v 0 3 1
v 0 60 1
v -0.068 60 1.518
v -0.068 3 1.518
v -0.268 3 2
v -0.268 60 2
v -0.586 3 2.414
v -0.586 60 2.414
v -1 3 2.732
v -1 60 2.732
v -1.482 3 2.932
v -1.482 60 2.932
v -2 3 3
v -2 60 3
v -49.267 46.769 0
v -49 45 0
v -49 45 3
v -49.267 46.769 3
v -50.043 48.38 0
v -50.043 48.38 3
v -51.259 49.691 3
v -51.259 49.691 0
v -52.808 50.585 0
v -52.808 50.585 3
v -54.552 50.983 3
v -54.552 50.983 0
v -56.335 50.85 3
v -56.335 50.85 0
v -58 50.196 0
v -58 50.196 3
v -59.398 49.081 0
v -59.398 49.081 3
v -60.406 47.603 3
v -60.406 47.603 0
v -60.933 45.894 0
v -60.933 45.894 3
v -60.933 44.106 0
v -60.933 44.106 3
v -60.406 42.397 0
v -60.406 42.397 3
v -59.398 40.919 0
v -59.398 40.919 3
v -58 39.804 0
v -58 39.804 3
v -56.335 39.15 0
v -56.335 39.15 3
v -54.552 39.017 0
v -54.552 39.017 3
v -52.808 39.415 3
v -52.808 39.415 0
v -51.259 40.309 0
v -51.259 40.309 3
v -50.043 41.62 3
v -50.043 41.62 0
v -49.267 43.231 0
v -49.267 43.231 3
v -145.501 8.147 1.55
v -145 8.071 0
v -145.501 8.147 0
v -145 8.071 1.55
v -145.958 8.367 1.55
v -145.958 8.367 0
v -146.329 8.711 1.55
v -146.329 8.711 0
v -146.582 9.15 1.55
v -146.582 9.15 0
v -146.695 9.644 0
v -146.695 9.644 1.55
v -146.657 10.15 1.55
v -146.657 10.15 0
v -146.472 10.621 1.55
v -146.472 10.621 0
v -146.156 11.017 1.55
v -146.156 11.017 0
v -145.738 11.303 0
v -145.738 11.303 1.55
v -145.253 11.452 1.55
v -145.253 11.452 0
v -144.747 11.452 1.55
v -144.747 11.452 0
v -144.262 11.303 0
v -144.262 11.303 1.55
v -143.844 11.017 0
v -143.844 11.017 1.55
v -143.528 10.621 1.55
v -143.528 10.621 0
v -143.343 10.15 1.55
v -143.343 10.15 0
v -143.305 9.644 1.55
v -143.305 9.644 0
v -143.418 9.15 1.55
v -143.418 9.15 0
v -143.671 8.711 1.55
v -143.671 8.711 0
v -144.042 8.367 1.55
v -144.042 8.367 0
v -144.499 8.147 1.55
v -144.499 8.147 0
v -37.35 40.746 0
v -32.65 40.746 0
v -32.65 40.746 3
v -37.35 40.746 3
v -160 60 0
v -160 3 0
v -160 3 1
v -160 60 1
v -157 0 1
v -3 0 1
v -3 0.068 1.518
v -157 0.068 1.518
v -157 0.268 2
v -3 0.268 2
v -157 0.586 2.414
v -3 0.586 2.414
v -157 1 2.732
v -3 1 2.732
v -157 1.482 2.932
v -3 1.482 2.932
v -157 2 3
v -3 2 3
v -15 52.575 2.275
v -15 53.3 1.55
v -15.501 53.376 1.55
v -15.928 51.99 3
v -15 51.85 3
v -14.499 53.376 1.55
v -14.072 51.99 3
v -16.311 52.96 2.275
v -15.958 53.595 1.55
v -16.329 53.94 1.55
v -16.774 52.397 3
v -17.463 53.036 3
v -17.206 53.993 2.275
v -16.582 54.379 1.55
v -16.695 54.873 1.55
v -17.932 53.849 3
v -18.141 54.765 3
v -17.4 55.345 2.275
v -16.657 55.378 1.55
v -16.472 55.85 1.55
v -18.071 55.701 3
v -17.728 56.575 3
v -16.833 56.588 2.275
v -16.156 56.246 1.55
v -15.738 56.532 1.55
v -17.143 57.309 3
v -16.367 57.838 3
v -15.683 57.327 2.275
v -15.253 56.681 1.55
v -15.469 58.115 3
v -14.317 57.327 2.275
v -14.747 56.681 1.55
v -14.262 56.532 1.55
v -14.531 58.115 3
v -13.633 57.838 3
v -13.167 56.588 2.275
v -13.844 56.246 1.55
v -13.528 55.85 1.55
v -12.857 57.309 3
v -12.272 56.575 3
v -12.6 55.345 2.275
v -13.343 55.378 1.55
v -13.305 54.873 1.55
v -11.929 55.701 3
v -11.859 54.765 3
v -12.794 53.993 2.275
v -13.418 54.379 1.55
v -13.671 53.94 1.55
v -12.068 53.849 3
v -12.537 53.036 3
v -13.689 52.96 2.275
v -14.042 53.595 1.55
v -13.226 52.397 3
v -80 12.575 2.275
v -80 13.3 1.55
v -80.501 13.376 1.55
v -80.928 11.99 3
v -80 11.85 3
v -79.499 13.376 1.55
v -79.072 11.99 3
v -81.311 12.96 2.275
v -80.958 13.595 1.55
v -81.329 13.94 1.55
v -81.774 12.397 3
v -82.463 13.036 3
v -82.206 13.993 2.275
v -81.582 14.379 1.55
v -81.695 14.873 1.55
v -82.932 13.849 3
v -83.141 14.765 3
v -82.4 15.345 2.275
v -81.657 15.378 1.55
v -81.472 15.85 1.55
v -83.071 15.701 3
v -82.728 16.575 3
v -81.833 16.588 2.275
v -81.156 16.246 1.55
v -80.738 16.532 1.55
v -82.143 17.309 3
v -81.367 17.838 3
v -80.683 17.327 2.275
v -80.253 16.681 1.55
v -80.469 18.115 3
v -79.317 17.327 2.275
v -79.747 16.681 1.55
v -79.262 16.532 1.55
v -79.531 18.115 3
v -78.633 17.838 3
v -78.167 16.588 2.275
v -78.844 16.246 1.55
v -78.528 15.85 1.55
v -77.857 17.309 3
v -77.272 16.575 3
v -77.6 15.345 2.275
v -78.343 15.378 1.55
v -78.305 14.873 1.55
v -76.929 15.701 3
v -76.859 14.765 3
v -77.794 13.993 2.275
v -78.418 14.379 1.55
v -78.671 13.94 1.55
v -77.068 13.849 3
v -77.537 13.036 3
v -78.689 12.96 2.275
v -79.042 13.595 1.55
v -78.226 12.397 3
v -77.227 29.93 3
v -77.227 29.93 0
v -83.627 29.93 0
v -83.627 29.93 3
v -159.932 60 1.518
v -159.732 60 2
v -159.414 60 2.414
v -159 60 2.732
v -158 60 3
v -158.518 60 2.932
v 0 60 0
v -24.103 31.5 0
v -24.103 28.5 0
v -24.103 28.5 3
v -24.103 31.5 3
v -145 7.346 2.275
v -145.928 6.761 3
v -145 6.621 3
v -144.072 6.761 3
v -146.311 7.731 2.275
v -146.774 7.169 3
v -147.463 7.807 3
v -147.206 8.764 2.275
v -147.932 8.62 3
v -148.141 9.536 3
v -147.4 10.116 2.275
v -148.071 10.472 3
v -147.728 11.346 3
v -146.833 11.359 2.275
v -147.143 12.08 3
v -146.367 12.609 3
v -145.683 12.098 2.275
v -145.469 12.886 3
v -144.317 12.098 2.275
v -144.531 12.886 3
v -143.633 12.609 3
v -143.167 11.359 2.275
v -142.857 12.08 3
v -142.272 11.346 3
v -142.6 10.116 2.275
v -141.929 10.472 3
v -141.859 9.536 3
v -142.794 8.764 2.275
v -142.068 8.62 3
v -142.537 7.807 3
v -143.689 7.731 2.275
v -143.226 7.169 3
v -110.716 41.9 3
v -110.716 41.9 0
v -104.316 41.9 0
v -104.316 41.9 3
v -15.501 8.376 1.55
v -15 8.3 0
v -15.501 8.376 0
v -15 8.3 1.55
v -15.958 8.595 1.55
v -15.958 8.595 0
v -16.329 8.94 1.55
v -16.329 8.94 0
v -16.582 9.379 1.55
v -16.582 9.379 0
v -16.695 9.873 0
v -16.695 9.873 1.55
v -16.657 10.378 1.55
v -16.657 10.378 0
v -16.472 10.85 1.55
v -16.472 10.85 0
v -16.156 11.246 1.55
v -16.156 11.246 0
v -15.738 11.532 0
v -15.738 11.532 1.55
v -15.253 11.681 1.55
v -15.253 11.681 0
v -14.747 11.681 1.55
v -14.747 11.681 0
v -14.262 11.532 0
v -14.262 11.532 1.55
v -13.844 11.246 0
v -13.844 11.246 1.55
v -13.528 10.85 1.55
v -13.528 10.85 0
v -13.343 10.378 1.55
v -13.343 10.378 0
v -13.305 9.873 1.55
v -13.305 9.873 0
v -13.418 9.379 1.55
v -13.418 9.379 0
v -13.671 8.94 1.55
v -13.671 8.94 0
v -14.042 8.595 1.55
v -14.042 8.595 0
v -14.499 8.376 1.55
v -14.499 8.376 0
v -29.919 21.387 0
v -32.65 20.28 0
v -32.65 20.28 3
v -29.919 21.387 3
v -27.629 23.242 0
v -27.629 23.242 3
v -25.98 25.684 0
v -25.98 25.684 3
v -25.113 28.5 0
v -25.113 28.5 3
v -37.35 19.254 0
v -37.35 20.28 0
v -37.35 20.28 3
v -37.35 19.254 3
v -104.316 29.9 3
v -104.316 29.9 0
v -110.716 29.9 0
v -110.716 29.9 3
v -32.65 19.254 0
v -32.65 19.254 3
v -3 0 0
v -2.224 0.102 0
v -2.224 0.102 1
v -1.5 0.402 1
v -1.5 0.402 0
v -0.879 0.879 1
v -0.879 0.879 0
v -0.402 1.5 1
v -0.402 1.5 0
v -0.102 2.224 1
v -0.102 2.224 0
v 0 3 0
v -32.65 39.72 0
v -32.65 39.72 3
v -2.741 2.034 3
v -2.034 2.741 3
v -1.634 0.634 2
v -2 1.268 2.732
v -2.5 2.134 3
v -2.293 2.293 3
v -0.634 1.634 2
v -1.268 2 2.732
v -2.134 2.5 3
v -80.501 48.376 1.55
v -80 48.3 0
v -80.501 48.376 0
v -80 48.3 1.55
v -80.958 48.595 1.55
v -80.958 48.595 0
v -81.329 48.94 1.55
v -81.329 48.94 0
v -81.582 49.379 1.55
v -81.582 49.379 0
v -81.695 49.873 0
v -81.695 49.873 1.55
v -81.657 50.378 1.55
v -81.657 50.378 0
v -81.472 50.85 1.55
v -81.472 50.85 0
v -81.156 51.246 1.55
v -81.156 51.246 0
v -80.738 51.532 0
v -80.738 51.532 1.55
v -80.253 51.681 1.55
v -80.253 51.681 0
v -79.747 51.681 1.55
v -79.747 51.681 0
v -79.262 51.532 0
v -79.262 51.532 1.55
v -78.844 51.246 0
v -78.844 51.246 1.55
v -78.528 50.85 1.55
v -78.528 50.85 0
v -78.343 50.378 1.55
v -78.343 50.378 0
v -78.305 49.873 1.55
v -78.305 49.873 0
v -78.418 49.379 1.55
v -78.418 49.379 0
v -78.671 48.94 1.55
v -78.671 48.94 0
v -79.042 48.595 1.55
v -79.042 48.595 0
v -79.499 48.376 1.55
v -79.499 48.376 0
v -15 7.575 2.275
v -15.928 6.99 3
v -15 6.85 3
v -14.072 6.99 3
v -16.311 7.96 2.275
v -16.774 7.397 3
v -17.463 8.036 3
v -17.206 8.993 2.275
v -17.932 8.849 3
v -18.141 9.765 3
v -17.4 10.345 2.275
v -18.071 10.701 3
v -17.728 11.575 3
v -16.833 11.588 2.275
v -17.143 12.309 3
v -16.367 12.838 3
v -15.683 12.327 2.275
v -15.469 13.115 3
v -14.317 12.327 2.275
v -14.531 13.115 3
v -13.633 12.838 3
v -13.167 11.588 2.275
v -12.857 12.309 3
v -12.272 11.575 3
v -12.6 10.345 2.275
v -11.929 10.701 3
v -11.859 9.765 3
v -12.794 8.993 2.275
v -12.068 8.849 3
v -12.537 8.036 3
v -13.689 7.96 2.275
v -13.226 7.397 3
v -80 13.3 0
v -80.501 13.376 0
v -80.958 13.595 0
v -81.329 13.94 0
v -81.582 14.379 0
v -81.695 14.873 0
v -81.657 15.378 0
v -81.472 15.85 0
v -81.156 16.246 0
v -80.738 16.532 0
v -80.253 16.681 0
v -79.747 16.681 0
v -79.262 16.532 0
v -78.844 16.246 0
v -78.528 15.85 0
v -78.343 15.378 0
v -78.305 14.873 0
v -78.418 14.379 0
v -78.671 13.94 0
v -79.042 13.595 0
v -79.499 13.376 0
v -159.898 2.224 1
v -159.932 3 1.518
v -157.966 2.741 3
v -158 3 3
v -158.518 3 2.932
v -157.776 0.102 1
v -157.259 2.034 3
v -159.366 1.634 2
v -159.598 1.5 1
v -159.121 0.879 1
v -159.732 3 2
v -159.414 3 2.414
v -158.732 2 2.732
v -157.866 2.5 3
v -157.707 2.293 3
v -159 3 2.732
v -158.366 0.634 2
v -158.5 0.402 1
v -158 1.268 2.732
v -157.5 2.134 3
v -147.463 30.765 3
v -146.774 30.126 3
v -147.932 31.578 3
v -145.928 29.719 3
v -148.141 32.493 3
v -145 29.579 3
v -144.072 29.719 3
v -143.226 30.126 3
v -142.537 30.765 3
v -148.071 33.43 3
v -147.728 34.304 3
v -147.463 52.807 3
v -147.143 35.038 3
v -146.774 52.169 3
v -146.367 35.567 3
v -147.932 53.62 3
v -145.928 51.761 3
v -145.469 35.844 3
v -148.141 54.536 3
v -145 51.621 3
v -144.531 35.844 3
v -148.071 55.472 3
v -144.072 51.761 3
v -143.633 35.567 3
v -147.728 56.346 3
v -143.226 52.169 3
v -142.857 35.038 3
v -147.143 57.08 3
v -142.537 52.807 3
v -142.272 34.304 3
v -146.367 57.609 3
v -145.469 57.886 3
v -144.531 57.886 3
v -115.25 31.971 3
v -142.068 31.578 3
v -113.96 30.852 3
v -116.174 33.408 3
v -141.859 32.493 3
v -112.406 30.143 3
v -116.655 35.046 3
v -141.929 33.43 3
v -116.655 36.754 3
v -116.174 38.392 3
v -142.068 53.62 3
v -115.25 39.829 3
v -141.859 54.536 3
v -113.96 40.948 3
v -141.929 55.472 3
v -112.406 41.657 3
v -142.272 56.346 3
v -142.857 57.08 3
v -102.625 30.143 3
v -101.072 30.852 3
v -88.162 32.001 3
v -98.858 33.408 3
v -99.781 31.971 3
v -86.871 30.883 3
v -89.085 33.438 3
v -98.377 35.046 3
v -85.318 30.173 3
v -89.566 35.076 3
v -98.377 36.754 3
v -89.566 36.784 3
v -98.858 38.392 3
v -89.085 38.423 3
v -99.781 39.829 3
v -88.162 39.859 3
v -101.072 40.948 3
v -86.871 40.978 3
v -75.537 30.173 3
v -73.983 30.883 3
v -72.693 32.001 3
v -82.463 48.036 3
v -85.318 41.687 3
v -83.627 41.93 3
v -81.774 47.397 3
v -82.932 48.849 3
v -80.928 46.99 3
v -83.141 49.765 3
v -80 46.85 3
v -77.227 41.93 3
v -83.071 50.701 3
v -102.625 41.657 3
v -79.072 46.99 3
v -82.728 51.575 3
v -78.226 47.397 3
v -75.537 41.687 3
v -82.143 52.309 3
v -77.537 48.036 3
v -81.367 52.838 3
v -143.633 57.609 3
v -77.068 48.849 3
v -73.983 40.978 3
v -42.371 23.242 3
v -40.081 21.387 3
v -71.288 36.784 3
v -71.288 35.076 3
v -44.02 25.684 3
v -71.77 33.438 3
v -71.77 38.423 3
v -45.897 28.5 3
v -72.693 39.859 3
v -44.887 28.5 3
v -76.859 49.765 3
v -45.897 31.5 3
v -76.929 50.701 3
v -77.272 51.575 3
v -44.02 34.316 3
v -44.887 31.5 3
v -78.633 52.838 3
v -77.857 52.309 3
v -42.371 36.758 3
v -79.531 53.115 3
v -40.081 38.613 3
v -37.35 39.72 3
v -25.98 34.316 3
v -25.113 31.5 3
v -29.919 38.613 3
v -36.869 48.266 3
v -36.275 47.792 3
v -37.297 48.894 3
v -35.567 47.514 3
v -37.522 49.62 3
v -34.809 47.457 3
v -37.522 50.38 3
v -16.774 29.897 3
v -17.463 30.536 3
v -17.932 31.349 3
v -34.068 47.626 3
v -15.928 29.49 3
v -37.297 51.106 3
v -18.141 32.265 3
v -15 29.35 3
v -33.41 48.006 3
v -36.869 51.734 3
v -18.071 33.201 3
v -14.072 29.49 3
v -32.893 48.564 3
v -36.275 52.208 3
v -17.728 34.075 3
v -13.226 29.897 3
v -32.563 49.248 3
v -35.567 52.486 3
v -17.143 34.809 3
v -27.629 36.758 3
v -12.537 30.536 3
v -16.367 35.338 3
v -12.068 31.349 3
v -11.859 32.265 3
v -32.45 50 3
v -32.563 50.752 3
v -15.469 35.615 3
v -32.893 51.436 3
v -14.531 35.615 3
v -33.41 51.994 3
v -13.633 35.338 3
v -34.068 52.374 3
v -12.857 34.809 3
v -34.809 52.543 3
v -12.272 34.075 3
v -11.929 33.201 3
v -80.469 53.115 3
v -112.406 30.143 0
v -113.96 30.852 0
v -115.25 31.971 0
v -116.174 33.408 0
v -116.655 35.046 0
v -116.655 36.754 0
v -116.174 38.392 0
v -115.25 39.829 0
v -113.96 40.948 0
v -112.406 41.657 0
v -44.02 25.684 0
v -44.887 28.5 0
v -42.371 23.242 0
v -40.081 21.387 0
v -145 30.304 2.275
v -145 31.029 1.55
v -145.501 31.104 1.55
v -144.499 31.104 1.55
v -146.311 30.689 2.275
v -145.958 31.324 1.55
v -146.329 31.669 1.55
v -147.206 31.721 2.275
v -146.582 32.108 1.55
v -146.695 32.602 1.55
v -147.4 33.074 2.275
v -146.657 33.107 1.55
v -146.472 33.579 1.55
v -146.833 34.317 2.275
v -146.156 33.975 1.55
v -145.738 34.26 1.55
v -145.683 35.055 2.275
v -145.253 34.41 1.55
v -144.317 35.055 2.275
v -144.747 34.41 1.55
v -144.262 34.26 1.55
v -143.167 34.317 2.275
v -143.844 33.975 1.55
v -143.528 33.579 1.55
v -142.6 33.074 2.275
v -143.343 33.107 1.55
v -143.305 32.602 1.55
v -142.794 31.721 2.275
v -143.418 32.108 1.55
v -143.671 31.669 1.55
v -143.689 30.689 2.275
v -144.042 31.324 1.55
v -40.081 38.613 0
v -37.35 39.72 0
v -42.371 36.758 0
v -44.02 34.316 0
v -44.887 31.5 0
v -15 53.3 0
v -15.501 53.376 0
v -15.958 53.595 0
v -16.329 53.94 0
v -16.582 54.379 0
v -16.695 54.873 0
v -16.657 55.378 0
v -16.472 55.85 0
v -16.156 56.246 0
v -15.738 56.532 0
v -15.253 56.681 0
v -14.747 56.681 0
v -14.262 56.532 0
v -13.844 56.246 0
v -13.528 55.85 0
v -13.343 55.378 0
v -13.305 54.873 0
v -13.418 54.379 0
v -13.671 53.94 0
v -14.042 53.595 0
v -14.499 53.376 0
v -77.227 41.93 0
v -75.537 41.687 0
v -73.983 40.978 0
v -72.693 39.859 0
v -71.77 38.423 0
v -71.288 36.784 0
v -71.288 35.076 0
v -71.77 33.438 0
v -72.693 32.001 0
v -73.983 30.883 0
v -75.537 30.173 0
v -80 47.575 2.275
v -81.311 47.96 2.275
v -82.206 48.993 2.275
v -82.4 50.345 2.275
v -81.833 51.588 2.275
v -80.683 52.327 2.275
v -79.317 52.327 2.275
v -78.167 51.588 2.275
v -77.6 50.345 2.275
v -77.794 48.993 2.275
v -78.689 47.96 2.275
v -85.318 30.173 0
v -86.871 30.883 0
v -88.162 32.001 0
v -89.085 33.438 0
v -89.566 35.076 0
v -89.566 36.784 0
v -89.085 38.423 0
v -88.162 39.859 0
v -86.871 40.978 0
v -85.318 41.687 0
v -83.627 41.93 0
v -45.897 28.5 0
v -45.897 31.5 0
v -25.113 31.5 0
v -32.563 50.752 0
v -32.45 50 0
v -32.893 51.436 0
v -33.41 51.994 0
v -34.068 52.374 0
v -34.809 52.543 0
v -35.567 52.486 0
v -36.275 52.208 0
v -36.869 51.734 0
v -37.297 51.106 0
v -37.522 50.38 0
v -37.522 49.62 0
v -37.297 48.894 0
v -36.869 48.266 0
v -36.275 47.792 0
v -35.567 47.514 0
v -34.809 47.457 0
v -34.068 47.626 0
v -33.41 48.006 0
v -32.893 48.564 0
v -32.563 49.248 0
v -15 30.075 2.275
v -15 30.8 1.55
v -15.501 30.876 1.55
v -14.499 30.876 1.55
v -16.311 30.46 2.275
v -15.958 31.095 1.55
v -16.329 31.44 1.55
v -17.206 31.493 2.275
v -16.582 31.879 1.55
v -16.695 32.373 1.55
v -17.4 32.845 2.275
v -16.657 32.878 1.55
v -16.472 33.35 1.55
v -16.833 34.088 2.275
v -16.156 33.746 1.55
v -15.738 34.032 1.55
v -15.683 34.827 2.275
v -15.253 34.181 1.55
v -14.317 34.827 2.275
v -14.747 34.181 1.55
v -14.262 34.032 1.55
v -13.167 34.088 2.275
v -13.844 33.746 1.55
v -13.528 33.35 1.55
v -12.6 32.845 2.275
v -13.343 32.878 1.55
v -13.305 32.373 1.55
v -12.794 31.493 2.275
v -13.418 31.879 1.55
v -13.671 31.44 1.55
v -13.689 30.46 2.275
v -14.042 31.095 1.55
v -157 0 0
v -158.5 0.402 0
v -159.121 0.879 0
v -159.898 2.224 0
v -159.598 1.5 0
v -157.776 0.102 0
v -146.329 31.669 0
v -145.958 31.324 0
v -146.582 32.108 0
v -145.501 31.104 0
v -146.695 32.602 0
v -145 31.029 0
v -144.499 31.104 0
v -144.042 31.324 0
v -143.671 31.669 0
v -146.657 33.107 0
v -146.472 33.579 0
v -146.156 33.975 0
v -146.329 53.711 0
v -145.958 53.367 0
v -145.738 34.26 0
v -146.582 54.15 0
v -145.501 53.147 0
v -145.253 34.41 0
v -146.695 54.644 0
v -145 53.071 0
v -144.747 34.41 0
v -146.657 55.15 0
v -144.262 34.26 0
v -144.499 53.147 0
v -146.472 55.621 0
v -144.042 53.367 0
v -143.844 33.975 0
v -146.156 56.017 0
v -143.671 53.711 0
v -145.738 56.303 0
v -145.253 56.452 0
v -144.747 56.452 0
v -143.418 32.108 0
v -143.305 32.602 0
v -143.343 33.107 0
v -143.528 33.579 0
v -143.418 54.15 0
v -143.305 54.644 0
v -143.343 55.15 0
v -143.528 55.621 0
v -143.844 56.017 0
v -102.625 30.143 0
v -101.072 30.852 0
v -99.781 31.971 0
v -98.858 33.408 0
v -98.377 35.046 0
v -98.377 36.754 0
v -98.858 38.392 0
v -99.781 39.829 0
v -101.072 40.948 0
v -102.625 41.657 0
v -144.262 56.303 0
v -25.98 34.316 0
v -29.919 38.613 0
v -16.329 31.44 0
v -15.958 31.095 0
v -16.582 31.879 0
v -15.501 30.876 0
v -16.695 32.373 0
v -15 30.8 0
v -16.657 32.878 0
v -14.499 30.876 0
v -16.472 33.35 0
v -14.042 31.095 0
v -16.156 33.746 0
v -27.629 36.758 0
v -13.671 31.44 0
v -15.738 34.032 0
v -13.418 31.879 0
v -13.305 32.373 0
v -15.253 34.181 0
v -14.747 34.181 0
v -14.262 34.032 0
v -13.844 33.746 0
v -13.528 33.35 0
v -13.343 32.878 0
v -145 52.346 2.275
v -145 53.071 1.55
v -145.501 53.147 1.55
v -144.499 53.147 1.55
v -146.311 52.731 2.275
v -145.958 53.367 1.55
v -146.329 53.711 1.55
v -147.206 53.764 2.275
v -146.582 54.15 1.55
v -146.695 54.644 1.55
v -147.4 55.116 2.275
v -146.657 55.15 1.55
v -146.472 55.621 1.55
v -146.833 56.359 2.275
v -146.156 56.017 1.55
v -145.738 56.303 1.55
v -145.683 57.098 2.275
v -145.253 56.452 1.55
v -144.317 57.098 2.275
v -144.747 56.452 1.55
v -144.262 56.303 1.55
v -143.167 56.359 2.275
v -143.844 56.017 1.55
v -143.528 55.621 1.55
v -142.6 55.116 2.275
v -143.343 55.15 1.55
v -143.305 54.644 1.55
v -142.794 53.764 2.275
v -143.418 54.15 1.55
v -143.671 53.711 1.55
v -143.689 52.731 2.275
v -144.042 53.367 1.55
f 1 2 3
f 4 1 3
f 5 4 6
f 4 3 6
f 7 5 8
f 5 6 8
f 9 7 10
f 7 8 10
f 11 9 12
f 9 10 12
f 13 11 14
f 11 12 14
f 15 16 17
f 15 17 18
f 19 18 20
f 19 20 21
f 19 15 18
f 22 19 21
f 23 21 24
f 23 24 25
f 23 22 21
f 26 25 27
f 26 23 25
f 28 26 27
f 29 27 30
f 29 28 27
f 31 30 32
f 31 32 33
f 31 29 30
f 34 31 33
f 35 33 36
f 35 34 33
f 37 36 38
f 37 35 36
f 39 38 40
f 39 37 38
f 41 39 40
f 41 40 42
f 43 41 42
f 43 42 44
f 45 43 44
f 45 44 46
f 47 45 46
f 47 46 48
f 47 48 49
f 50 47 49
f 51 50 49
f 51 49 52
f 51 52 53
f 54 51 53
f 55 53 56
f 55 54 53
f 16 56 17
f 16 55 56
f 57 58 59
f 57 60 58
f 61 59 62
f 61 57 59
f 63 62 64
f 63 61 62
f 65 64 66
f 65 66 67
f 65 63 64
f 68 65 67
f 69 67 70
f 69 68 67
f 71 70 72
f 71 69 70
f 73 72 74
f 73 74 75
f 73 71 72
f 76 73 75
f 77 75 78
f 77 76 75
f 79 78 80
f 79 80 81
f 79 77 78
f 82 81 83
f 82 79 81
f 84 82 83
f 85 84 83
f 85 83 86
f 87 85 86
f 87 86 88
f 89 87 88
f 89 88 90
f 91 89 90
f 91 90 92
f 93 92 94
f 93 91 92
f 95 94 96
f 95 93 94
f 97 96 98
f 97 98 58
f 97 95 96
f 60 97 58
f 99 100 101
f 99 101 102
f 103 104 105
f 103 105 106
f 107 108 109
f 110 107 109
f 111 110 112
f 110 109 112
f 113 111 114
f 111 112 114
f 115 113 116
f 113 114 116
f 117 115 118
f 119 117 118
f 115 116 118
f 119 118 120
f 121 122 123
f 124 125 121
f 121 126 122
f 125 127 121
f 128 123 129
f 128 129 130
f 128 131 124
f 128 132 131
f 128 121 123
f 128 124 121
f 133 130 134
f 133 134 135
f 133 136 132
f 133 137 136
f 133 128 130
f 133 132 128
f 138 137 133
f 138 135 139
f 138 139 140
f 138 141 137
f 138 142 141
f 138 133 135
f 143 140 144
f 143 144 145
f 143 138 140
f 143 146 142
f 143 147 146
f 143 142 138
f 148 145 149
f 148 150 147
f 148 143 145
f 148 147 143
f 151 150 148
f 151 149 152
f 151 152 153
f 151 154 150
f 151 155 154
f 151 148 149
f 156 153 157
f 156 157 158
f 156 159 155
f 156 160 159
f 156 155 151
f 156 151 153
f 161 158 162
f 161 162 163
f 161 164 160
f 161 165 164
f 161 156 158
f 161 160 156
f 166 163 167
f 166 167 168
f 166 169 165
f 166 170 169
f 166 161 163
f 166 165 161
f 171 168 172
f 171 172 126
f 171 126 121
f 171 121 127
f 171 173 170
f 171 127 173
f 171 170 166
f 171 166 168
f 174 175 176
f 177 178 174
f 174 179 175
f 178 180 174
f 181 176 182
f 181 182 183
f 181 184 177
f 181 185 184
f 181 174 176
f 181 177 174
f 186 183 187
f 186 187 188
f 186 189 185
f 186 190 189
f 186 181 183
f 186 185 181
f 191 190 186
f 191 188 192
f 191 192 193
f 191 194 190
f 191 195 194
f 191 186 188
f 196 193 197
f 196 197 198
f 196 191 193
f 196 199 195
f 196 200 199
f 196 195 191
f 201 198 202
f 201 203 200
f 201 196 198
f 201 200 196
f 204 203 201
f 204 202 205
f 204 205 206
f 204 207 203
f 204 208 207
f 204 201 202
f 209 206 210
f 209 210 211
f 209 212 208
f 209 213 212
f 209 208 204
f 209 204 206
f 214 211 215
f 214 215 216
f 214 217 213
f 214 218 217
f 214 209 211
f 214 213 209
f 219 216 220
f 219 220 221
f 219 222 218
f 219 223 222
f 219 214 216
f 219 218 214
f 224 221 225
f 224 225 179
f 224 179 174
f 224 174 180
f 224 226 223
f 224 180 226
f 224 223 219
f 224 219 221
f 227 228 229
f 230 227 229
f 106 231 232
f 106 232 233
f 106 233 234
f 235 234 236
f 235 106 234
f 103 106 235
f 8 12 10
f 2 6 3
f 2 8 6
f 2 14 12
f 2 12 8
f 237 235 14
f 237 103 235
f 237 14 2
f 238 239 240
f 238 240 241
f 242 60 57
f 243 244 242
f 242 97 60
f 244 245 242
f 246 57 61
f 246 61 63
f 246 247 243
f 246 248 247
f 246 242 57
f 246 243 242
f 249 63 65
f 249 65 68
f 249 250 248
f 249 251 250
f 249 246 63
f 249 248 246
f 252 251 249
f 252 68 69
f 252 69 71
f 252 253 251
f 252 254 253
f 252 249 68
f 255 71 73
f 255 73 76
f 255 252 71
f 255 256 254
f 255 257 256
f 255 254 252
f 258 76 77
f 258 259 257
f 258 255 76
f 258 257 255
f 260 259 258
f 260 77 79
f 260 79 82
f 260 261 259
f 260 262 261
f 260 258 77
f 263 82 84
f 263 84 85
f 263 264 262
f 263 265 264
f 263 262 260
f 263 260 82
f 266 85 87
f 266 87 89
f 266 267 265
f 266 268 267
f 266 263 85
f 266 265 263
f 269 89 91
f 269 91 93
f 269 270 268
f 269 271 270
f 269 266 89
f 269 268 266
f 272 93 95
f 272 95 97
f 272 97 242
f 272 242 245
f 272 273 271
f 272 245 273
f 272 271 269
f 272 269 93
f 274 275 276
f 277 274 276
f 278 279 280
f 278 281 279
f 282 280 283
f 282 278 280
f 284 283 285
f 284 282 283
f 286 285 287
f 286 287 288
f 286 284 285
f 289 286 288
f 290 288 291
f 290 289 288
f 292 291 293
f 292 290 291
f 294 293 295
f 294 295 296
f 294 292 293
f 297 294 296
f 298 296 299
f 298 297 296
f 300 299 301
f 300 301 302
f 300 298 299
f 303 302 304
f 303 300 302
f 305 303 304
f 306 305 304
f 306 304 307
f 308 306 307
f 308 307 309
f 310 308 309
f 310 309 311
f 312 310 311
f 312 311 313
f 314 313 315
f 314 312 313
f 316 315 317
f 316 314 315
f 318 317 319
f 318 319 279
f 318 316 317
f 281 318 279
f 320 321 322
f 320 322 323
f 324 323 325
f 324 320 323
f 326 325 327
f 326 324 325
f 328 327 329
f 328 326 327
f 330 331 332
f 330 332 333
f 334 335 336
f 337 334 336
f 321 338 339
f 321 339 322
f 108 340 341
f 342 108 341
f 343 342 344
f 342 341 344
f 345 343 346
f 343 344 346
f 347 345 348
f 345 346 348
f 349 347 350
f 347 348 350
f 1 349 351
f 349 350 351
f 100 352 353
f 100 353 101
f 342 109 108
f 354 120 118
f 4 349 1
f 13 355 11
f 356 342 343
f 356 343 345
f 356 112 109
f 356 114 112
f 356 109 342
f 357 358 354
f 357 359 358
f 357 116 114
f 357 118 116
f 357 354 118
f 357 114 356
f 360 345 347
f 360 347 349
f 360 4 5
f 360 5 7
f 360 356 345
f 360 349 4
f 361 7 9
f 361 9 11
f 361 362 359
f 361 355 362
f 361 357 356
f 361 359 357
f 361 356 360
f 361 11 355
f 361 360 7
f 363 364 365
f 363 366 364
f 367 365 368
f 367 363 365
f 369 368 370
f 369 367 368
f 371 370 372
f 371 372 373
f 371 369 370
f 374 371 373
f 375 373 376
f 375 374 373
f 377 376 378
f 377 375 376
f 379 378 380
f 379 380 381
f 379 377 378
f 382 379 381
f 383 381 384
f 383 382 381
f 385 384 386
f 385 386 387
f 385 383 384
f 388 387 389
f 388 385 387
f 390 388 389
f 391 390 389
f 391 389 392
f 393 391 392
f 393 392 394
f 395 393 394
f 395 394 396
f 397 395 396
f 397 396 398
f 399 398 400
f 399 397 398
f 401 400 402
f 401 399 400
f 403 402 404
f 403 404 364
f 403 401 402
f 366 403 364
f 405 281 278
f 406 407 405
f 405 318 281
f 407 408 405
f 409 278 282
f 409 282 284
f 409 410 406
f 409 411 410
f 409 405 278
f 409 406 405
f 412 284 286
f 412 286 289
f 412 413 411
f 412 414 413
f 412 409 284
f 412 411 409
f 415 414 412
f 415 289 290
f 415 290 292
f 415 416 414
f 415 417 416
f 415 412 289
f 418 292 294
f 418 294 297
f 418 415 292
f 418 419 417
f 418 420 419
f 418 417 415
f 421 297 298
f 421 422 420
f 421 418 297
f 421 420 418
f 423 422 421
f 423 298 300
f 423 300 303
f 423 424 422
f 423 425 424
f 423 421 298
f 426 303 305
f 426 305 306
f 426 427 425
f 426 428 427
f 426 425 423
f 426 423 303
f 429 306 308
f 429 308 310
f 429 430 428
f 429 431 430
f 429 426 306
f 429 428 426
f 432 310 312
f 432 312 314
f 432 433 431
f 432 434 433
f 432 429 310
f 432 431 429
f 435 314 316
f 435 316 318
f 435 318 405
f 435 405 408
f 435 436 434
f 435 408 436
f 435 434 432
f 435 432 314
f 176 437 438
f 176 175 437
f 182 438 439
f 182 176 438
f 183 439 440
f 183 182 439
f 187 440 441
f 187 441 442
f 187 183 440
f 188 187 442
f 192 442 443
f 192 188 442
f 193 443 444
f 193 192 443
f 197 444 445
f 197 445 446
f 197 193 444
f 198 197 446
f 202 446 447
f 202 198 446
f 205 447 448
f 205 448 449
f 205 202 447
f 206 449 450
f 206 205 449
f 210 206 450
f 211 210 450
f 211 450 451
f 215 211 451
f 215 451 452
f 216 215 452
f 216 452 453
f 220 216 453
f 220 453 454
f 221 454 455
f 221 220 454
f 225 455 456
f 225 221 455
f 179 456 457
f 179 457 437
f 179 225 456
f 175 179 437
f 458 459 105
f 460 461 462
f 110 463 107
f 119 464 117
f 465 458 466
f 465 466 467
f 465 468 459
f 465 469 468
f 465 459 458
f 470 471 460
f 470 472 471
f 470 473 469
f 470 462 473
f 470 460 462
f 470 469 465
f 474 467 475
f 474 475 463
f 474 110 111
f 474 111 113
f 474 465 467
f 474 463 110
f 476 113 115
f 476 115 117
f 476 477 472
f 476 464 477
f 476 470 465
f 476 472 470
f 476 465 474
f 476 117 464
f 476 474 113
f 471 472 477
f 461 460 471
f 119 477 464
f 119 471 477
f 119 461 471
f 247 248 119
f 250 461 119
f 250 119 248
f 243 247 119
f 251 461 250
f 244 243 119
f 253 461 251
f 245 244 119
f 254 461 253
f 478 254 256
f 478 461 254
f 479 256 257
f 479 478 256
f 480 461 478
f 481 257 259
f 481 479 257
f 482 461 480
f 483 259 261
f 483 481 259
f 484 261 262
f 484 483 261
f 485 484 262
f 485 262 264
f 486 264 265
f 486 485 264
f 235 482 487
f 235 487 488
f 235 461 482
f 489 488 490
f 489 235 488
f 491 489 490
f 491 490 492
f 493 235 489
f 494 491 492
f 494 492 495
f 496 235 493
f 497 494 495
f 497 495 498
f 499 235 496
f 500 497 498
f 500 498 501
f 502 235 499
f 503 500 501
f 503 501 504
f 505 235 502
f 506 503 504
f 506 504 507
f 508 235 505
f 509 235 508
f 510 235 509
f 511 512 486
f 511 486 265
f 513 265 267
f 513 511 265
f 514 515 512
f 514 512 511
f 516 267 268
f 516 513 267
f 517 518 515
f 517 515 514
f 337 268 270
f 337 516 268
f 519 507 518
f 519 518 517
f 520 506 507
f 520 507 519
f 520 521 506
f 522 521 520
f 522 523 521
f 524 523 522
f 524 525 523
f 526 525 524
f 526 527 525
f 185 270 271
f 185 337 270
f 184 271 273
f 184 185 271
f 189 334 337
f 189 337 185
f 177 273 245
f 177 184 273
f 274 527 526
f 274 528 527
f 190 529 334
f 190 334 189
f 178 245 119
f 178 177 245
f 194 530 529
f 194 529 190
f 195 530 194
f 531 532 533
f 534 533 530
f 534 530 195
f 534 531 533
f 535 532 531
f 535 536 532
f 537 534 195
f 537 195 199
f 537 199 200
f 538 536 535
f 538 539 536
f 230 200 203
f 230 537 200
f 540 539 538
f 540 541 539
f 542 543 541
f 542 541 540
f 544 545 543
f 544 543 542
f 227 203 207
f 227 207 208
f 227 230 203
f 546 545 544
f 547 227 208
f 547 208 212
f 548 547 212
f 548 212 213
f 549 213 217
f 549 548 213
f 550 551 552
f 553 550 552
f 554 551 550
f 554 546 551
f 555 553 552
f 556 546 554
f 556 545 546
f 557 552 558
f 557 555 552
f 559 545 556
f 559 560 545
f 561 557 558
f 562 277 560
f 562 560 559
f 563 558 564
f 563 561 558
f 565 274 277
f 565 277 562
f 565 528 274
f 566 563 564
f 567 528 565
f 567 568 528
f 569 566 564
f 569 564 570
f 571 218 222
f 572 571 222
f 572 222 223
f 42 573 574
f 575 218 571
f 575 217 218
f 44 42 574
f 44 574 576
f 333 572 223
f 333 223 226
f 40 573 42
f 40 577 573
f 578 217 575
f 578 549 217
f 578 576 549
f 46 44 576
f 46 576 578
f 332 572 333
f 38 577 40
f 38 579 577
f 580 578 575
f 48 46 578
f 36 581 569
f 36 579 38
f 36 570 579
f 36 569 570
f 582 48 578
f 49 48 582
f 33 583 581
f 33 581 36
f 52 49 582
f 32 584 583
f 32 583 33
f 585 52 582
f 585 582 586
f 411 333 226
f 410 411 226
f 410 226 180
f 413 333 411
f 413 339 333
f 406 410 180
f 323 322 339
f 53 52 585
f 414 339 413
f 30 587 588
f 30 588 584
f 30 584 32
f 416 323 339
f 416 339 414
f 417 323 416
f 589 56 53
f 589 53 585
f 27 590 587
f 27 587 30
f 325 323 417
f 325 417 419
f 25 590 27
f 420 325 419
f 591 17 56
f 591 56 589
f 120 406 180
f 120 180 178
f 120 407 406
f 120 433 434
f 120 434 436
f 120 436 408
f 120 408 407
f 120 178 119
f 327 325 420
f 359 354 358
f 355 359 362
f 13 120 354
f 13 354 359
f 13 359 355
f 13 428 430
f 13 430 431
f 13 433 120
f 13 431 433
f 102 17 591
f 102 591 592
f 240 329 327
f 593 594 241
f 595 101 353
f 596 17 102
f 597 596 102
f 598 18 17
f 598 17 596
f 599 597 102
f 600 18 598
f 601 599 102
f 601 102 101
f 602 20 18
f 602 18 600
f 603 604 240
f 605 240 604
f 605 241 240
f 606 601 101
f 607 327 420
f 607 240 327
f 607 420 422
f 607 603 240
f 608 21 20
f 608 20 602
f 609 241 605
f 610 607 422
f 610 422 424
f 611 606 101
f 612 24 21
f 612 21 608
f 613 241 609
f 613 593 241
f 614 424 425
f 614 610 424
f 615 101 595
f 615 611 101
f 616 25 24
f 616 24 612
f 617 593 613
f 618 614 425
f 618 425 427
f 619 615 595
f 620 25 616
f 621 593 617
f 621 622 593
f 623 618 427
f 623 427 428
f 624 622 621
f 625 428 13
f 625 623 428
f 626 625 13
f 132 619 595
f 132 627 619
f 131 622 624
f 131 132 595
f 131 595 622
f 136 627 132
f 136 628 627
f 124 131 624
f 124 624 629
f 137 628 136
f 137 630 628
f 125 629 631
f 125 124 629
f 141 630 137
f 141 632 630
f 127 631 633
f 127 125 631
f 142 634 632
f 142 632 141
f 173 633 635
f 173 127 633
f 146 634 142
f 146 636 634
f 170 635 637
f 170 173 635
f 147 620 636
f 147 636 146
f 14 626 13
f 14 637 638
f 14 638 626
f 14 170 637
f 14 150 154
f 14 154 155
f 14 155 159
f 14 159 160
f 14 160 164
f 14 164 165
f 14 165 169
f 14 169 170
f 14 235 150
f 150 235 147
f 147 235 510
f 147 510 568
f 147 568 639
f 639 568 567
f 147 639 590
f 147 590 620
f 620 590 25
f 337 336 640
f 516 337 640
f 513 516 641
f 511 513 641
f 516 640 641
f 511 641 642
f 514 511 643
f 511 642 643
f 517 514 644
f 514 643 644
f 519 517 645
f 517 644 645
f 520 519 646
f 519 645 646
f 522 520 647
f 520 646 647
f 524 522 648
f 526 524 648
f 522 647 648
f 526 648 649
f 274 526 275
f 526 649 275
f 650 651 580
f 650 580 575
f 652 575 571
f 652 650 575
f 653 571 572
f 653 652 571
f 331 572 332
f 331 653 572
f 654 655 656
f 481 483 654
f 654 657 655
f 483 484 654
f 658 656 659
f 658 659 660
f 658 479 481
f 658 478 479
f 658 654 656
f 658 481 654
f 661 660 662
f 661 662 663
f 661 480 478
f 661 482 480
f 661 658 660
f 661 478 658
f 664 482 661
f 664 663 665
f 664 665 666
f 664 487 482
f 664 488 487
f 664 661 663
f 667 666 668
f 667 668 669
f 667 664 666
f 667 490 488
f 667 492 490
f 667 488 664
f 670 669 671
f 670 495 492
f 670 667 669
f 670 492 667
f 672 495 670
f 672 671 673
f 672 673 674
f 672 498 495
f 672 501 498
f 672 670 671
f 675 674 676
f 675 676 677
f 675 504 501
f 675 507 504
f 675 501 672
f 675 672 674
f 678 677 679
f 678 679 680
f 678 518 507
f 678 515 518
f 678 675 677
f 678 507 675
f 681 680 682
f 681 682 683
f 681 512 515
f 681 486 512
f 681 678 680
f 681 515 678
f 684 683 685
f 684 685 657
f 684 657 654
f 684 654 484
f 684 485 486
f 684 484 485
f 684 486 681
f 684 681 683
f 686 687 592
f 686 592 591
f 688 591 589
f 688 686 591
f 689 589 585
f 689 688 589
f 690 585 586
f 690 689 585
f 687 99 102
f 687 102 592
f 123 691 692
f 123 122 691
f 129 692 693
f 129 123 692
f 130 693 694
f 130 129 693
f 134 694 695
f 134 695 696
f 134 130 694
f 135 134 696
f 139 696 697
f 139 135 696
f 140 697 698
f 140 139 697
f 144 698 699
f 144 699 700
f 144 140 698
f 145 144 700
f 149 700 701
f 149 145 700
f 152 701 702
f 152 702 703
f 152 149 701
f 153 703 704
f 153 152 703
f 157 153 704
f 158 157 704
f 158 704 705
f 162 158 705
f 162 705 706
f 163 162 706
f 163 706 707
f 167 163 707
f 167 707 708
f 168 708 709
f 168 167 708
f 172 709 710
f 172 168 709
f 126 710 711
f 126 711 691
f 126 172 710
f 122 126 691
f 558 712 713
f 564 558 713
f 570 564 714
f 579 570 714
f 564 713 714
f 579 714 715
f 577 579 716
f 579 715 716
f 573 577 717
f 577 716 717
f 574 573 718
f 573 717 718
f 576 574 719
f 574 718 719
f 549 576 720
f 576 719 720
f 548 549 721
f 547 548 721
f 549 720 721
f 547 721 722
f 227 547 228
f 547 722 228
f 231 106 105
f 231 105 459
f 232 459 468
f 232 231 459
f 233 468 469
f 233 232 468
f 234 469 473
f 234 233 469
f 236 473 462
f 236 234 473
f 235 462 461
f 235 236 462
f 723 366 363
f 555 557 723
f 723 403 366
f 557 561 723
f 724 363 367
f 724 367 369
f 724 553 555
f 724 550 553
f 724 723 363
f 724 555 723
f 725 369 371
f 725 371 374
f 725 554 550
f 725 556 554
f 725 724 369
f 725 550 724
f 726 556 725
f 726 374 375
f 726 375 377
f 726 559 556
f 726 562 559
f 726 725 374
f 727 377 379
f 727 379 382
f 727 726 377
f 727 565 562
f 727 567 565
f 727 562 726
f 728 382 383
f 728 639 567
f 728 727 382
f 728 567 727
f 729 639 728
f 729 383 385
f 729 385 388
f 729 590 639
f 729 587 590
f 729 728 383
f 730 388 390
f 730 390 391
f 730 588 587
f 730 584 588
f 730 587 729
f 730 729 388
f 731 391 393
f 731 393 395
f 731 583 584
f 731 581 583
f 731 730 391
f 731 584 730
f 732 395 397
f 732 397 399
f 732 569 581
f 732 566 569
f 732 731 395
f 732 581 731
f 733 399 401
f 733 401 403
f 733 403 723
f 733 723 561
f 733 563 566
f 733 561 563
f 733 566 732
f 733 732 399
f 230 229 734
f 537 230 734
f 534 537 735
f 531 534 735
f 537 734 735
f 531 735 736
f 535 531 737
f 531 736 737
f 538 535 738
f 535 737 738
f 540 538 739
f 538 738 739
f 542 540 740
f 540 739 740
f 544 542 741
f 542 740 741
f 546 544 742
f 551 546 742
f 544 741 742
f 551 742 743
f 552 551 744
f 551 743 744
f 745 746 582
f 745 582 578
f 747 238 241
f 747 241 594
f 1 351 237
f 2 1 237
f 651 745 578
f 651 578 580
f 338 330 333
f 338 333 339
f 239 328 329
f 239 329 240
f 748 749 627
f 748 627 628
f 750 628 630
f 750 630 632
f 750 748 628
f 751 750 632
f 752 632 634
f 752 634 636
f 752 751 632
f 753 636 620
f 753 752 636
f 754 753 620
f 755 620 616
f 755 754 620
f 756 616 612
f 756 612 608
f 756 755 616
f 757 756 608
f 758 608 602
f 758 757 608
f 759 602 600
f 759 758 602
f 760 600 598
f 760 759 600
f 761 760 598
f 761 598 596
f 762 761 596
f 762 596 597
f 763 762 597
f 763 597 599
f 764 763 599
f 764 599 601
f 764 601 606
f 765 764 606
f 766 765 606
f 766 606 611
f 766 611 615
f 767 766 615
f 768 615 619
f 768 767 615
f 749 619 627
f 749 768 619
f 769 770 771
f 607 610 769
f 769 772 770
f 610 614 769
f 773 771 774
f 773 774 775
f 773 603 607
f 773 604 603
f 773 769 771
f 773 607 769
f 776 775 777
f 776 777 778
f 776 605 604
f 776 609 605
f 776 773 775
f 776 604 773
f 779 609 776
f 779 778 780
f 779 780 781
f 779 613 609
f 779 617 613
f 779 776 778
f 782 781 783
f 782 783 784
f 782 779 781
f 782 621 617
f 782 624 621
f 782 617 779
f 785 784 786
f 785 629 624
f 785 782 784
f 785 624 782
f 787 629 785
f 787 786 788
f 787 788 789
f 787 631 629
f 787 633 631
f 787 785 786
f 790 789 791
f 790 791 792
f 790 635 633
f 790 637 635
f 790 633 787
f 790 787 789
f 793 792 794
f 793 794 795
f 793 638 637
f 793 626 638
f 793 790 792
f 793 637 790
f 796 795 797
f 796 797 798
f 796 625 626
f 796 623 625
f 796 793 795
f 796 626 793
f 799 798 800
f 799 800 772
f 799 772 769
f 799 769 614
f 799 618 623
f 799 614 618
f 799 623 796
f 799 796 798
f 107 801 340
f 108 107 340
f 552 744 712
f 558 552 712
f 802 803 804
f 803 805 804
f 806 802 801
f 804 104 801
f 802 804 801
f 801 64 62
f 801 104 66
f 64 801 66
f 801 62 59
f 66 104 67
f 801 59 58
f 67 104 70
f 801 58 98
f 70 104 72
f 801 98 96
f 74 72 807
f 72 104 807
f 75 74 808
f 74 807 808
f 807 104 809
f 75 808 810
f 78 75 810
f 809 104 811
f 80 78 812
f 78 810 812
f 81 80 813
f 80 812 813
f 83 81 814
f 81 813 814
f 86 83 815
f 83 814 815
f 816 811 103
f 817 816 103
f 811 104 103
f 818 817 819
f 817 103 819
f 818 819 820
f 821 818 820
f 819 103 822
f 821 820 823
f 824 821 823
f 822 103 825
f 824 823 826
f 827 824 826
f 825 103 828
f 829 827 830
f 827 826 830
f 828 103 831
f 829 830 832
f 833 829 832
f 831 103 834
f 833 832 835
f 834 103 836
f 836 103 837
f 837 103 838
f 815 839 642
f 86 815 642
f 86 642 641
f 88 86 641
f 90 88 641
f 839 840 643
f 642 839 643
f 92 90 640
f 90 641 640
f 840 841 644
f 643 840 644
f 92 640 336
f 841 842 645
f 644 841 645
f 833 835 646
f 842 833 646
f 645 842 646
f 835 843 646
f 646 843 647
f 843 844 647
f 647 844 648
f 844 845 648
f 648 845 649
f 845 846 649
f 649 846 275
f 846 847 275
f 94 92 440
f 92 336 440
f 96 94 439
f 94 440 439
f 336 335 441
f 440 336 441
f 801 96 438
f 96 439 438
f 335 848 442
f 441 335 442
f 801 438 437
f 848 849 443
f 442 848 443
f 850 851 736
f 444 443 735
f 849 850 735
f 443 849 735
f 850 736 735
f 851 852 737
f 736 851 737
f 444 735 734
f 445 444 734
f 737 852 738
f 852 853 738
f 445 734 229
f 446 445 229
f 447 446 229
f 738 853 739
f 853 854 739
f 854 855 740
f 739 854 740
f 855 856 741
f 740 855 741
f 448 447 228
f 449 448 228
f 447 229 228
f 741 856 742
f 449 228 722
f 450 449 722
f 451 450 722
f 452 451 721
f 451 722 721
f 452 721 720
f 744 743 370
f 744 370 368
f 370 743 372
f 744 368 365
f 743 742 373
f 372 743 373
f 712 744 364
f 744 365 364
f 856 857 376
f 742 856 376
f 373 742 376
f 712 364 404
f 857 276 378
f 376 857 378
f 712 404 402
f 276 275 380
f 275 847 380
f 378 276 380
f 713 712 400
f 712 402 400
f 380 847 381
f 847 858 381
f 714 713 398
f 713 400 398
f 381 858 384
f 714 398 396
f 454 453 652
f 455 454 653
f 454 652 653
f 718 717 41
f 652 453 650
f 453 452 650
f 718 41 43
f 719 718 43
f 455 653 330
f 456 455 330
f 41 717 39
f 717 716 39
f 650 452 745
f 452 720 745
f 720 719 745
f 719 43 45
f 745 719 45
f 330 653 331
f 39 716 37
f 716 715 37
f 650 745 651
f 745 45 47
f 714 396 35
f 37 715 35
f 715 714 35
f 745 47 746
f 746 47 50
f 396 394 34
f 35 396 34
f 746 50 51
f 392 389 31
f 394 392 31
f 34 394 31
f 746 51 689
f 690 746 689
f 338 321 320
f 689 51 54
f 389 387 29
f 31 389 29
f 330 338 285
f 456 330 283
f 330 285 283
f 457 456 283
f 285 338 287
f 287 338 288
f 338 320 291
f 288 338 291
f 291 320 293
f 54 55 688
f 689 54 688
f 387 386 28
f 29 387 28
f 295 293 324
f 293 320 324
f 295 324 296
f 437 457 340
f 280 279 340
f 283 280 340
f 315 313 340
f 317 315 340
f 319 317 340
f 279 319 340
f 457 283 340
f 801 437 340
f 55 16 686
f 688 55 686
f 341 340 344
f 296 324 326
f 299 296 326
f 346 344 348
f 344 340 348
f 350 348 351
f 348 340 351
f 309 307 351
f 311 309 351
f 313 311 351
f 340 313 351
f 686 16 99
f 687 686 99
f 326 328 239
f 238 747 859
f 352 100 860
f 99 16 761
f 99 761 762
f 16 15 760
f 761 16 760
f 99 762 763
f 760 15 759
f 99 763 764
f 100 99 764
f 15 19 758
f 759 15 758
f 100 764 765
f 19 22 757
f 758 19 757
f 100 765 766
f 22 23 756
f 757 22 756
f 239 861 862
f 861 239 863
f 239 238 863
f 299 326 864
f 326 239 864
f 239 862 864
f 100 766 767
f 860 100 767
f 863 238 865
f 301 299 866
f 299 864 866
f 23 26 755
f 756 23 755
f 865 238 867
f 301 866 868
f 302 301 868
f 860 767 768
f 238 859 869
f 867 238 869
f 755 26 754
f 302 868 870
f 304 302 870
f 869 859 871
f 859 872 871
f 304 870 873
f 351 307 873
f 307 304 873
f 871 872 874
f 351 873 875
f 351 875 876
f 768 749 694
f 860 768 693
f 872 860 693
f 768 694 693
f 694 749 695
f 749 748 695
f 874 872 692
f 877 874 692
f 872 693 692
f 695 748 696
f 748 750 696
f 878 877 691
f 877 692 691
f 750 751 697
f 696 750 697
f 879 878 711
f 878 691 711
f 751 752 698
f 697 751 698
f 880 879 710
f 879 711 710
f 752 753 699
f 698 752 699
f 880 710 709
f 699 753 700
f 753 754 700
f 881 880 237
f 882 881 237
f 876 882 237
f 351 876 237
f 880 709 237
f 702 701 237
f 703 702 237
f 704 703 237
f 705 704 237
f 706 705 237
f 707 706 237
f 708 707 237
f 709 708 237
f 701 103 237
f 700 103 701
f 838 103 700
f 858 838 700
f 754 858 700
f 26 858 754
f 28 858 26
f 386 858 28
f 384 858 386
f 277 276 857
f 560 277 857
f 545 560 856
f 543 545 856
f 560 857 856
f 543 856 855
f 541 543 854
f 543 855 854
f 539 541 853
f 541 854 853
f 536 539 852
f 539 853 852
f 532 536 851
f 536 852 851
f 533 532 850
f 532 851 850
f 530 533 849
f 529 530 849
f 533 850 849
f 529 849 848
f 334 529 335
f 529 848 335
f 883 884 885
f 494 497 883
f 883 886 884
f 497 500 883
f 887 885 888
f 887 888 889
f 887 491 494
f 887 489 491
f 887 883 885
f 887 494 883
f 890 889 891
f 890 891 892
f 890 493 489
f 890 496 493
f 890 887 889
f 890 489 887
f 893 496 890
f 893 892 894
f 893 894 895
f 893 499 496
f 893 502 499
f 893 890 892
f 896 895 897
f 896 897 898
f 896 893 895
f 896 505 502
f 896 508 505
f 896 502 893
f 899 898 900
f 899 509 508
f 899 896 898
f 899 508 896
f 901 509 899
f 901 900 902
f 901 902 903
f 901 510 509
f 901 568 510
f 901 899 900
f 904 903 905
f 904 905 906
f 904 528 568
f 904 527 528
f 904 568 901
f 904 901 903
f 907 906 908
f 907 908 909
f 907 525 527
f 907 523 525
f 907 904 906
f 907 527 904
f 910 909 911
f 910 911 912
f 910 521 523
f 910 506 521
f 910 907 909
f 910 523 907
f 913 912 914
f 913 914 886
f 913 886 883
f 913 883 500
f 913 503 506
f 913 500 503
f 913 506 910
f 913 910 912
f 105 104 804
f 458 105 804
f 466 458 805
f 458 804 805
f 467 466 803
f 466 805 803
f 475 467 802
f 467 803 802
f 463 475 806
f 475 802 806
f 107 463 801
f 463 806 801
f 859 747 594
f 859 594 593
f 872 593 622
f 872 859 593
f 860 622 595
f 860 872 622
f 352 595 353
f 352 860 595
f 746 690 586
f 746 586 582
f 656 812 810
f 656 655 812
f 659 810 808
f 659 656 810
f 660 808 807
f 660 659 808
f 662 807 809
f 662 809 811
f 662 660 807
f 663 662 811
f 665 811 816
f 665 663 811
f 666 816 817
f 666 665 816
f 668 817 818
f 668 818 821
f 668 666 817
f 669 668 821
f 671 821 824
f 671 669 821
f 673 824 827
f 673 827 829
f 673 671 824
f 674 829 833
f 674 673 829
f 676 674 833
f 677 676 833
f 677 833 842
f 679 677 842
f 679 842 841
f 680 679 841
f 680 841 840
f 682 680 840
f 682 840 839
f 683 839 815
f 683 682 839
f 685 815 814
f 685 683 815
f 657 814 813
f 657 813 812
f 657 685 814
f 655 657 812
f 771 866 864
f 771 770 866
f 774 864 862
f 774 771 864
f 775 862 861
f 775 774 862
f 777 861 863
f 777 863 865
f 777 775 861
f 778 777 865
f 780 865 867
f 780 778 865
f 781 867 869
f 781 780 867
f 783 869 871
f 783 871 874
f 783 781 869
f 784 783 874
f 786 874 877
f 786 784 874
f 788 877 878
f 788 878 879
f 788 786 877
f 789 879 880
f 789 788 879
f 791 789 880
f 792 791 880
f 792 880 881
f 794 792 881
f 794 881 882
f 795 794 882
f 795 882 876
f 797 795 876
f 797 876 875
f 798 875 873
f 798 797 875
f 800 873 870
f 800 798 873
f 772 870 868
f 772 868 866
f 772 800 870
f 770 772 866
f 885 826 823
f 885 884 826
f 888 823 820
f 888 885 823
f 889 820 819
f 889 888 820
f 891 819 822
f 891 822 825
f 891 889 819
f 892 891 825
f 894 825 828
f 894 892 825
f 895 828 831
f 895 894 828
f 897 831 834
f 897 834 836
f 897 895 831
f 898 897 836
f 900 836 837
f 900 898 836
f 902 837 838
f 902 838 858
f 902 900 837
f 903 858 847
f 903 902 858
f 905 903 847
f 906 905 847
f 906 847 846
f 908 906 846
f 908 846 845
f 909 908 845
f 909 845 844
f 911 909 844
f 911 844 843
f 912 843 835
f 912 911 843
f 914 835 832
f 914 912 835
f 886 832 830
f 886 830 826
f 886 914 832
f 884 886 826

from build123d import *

# Parameters (mm, degrees)
SKETCH11_W                                     = 160
SKETCH11_H                                     = 60
SKETCH11_R                                     = 2.55
SKETCH11_R_2                                   = 6
BOSS_EXTRUDE1_DEPTH                            = 3
FILLET1_R                                      = 2
FILLET3_R                                      = 3
CSK_FOR_M3_FLAT_HEAD_MACHINE_SCREW1_AT_2_COUNT = 2
CSK_FOR_M3_FLAT_HEAD_MACHINE_SCREW1_AT_2_PITCH = 22.042551394
CSK_FOR_M3_FLAT_HEAD_MACHINE_SCREW1_AT_3_COUNT = 2
CSK_FOR_M3_FLAT_HEAD_MACHINE_SCREW1_AT_3_PITCH = 45
CSK_FOR_M3_FLAT_HEAD_MACHINE_SCREW1_AT_4_COUNT = 2
CSK_FOR_M3_FLAT_HEAD_MACHINE_SCREW1_AT_4_PITCH = 137.493516675
CSK_FOR_M3_FLAT_HEAD_MACHINE_SCREW1_AT_5_COUNT = 2
CSK_FOR_M3_FLAT_HEAD_MACHINE_SCREW1_AT_5_PITCH = 131.893933603
CSK_FOR_M3_FLAT_HEAD_MACHINE_SCREW1_AT_6_COUNT = 2
CSK_FOR_M3_FLAT_HEAD_MACHINE_SCREW1_AT_6_PITCH = 130.000201211
CSK_FOR_M3_FLAT_HEAD_MACHINE_SCREW1_AT_7_COUNT = 2
CSK_FOR_M3_FLAT_HEAD_MACHINE_SCREW1_AT_7_PITCH = 65.174880681
CSK_FOR_M3_FLAT_HEAD_MACHINE_SCREW1_AT_8_COUNT = 2
CSK_FOR_M3_FLAT_HEAD_MACHINE_SCREW1_AT_8_PITCH = 76.202062771


with BuildPart() as part:
    # Sketch11 → Boss-Extrude1 (new body)
    with BuildSketch(Plane.XY):
        with Locations((-80, 30)):
            Rectangle(SKETCH11_W, SKETCH11_H)
        with Locations((-35, 50)):
            Circle(SKETCH11_R, mode=Mode.SUBTRACT)
        with Locations((-55, 45)):
            Circle(SKETCH11_R_2, mode=Mode.SUBTRACT)
        with BuildLine():
            Line((-44.886859967, 31.5), (-45.897247359, 31.5))
            Line((-45.897247359, 31.5), (-45.897247359, 28.5))
            Line((-45.897247359, 28.5), (-44.886859967, 28.5))
            ThreePointArc((-44.886859967, 28.5), (-42.370691635, 23.241826814), (-37.35, 20.280046296))
            Line((-37.35, 20.280046296), (-37.35, 19.253954216))
            Line((-37.35, 19.253954216), (-32.65, 19.253954216))
            Line((-32.65, 19.253954216), (-32.65, 20.280046296))
            ThreePointArc((-32.65, 20.280046296), (-27.629308365, 23.241826814), (-25.113140033, 28.5))
            Line((-25.113140033, 28.5), (-24.102752641, 28.5))
            Line((-24.102752641, 28.5), (-24.102752641, 31.5))
            Line((-24.102752641, 31.5), (-25.113140033, 31.5))
            ThreePointArc((-25.113140033, 31.5), (-27.629308365, 36.758173186), (-32.65, 39.719953704))
            Line((-32.65, 39.719953704), (-32.65, 40.746045784))
            Line((-32.65, 40.746045784), (-37.35, 40.746045784))
            Line((-37.35, 40.746045784), (-37.35, 39.719953704))
            ThreePointArc((-37.35, 39.719953704), (-42.370691635, 36.758173186), (-44.886859967, 31.5))
        make_face(mode=Mode.SUBTRACT)
        with BuildLine():
            Line((-83.627304882, 41.930328357), (-77.227304882, 41.930328357))
            ThreePointArc((-77.227304882, 41.930328357), (-71.227304882, 35.930328357), (-77.227304882, 29.930328357))
            Line((-77.227304882, 29.930328357), (-83.627304882, 29.930328357))
            ThreePointArc((-83.627304882, 29.930328357), (-89.627304882, 35.930328357), (-83.627304882, 41.930328357))
        make_face(mode=Mode.SUBTRACT)
        with BuildLine():
            Line((-110.715747539, 41.9), (-104.315747539, 41.9))
            ThreePointArc((-104.315747539, 41.9), (-98.315747539, 35.9), (-104.315747539, 29.9))
            Line((-104.315747539, 29.9), (-110.715747539, 29.9))
            ThreePointArc((-110.715747539, 29.9), (-116.715747539, 35.9), (-110.715747539, 41.9))
        make_face(mode=Mode.SUBTRACT)
    extrude(amount=BOSS_EXTRUDE1_DEPTH)

    # Fillet1
    fillet1_edges = [part.edges().sort_by_distance(p)[0] for p in [
        (-160, 30, 3),
        (-80, 0, 3),
        (0, 30, 3),
    ]]
    fillet(fillet1_edges, radius=FILLET1_R)

    # Fillet3
    # the kernel refuses this fillet: 3 mm, written as the material it takes off along each edge
    with BuildSketch(Plane(origin=(-3, 3, 3), x_dir=(0, -1, 0), z_dir=(-1, 0, 0))) as fillet3_piece_1:
        with BuildLine():
            CenterArc((1, -2), 2, 0, 90)
            Line((3, -2), (3, 0))
            Line((3, 0), (1, 0))
        make_face()
    revolve(axis=Axis((-3, 3, 3), (0, 0, 1)), revolution_arc=90, mode=Mode.SUBTRACT)
    with BuildSketch(Plane(origin=(-157, 3, 3), x_dir=(-1, 0, 0), z_dir=(0, 1, 0))) as fillet3_piece_2:
        with BuildLine():
            CenterArc((1, -2), 2, 0, 90)
            Line((3, -2), (3, 0))
            Line((3, 0), (1, 0))
        make_face()
    revolve(axis=Axis((-157, 3, 3), (0, 0, 1)), revolution_arc=90, mode=Mode.SUBTRACT)
    with BuildSketch(Plane(origin=(0, 0, -7.5), x_dir=(-1, 0, 0), z_dir=(0, 0, 1))) as fillet3_piece_3:
        with BuildLine():
            CenterArc((FILLET3_R, -FILLET3_R), FILLET3_R, 90, 90)
            Line((0, -FILLET3_R), (0, 0))
            Line((0, 0), (FILLET3_R, 0))
        make_face()
    extrude(amount=10.5, mode=Mode.SUBTRACT)
    with BuildSketch(Plane(origin=(-160, 0, -7.5), x_dir=(1, 0, 0), z_dir=(0, 0, 1))) as fillet3_piece_4:
        with BuildLine():
            CenterArc((FILLET3_R, FILLET3_R), FILLET3_R, 180, 90)
            Line((0, FILLET3_R), (0, 0))
            Line((0, 0), (FILLET3_R, 0))
        make_face()
    extrude(amount=10.5, mode=Mode.SUBTRACT)

    # Sketch13 → CSK for M3 Flat Head Machine Screw1 (revolve, cut)
    with BuildSketch(Plane(origin=(-145, 54.771275697, 3), x_dir=(0, -1, 0), z_dir=(1, 0, 0))):
        Polygon((0, 0), (0, 3), (1.7, 3), (1.7, 1.45), (3.15, 0), align=None)
    csk_for_m3_flat_head_machine_screw1 = revolve(axis=Axis((-145, 54.771275697, 9.35), (0, 0, -1)), mode=Mode.SUBTRACT)

    # CSK for M3 Flat Head Machine Screw1 at 2: CSK for M3 Flat Head Machine Screw1 ×2
    with Locations(*[(0, -i * CSK_FOR_M3_FLAT_HEAD_MACHINE_SCREW1_AT_2_PITCH, 0) for i in range(1, CSK_FOR_M3_FLAT_HEAD_MACHINE_SCREW1_AT_2_COUNT)]):
        add(csk_for_m3_flat_head_machine_screw1, mode=Mode.SUBTRACT)

    # CSK for M3 Flat Head Machine Screw1 at 3: CSK for M3 Flat Head Machine Screw1 ×2
    with Locations(*[(0, -i * CSK_FOR_M3_FLAT_HEAD_MACHINE_SCREW1_AT_3_PITCH, 0) for i in range(1, CSK_FOR_M3_FLAT_HEAD_MACHINE_SCREW1_AT_3_COUNT)]):
        add(csk_for_m3_flat_head_machine_screw1, mode=Mode.SUBTRACT)

    # CSK for M3 Flat Head Machine Screw1 at 4: CSK for M3 Flat Head Machine Screw1 ×2
    with Locations(*[Vector(0.9454991271168814, -0.32562463147190707, 0) * (i * CSK_FOR_M3_FLAT_HEAD_MACHINE_SCREW1_AT_4_PITCH) for i in range(1, CSK_FOR_M3_FLAT_HEAD_MACHINE_SCREW1_AT_4_COUNT)]):
        add(csk_for_m3_flat_head_machine_screw1, mode=Mode.SUBTRACT)

    # CSK for M3 Flat Head Machine Screw1 at 5: CSK for M3 Flat Head Machine Screw1 ×2
    with Locations(*[Vector(0.9856404798092461, -0.16885746818367017, 0) * (i * CSK_FOR_M3_FLAT_HEAD_MACHINE_SCREW1_AT_5_PITCH) for i in range(1, CSK_FOR_M3_FLAT_HEAD_MACHINE_SCREW1_AT_5_COUNT)]):
        add(csk_for_m3_flat_head_machine_screw1, mode=Mode.SUBTRACT)

    # CSK for M3 Flat Head Machine Screw1 at 6: CSK for M3 Flat Head Machine Screw1 ×2
    with Locations(*[Vector(0.9999984522282437, 0.001759414992816724, 0) * (i * CSK_FOR_M3_FLAT_HEAD_MACHINE_SCREW1_AT_6_PITCH) for i in range(1, CSK_FOR_M3_FLAT_HEAD_MACHINE_SCREW1_AT_6_COUNT)]):
        add(csk_for_m3_flat_head_machine_screw1, mode=Mode.SUBTRACT)

    # CSK for M3 Flat Head Machine Screw1 at 7: CSK for M3 Flat Head Machine Screw1 ×2
    with Locations(*[Vector(0.997316747201951, -0.07320727935472046, 0) * (i * CSK_FOR_M3_FLAT_HEAD_MACHINE_SCREW1_AT_7_PITCH) for i in range(1, CSK_FOR_M3_FLAT_HEAD_MACHINE_SCREW1_AT_7_COUNT)]):
        add(csk_for_m3_flat_head_machine_screw1, mode=Mode.SUBTRACT)

    # CSK for M3 Flat Head Machine Screw1 at 8: CSK for M3 Flat Head Machine Screw1 ×2
    with Locations(*[Vector(0.8529952817065795, -0.5219186233373103, 0) * (i * CSK_FOR_M3_FLAT_HEAD_MACHINE_SCREW1_AT_8_PITCH) for i in range(1, CSK_FOR_M3_FLAT_HEAD_MACHINE_SCREW1_AT_8_COUNT)]):
        add(csk_for_m3_flat_head_machine_screw1, mode=Mode.SUBTRACT)


solid = part.part
